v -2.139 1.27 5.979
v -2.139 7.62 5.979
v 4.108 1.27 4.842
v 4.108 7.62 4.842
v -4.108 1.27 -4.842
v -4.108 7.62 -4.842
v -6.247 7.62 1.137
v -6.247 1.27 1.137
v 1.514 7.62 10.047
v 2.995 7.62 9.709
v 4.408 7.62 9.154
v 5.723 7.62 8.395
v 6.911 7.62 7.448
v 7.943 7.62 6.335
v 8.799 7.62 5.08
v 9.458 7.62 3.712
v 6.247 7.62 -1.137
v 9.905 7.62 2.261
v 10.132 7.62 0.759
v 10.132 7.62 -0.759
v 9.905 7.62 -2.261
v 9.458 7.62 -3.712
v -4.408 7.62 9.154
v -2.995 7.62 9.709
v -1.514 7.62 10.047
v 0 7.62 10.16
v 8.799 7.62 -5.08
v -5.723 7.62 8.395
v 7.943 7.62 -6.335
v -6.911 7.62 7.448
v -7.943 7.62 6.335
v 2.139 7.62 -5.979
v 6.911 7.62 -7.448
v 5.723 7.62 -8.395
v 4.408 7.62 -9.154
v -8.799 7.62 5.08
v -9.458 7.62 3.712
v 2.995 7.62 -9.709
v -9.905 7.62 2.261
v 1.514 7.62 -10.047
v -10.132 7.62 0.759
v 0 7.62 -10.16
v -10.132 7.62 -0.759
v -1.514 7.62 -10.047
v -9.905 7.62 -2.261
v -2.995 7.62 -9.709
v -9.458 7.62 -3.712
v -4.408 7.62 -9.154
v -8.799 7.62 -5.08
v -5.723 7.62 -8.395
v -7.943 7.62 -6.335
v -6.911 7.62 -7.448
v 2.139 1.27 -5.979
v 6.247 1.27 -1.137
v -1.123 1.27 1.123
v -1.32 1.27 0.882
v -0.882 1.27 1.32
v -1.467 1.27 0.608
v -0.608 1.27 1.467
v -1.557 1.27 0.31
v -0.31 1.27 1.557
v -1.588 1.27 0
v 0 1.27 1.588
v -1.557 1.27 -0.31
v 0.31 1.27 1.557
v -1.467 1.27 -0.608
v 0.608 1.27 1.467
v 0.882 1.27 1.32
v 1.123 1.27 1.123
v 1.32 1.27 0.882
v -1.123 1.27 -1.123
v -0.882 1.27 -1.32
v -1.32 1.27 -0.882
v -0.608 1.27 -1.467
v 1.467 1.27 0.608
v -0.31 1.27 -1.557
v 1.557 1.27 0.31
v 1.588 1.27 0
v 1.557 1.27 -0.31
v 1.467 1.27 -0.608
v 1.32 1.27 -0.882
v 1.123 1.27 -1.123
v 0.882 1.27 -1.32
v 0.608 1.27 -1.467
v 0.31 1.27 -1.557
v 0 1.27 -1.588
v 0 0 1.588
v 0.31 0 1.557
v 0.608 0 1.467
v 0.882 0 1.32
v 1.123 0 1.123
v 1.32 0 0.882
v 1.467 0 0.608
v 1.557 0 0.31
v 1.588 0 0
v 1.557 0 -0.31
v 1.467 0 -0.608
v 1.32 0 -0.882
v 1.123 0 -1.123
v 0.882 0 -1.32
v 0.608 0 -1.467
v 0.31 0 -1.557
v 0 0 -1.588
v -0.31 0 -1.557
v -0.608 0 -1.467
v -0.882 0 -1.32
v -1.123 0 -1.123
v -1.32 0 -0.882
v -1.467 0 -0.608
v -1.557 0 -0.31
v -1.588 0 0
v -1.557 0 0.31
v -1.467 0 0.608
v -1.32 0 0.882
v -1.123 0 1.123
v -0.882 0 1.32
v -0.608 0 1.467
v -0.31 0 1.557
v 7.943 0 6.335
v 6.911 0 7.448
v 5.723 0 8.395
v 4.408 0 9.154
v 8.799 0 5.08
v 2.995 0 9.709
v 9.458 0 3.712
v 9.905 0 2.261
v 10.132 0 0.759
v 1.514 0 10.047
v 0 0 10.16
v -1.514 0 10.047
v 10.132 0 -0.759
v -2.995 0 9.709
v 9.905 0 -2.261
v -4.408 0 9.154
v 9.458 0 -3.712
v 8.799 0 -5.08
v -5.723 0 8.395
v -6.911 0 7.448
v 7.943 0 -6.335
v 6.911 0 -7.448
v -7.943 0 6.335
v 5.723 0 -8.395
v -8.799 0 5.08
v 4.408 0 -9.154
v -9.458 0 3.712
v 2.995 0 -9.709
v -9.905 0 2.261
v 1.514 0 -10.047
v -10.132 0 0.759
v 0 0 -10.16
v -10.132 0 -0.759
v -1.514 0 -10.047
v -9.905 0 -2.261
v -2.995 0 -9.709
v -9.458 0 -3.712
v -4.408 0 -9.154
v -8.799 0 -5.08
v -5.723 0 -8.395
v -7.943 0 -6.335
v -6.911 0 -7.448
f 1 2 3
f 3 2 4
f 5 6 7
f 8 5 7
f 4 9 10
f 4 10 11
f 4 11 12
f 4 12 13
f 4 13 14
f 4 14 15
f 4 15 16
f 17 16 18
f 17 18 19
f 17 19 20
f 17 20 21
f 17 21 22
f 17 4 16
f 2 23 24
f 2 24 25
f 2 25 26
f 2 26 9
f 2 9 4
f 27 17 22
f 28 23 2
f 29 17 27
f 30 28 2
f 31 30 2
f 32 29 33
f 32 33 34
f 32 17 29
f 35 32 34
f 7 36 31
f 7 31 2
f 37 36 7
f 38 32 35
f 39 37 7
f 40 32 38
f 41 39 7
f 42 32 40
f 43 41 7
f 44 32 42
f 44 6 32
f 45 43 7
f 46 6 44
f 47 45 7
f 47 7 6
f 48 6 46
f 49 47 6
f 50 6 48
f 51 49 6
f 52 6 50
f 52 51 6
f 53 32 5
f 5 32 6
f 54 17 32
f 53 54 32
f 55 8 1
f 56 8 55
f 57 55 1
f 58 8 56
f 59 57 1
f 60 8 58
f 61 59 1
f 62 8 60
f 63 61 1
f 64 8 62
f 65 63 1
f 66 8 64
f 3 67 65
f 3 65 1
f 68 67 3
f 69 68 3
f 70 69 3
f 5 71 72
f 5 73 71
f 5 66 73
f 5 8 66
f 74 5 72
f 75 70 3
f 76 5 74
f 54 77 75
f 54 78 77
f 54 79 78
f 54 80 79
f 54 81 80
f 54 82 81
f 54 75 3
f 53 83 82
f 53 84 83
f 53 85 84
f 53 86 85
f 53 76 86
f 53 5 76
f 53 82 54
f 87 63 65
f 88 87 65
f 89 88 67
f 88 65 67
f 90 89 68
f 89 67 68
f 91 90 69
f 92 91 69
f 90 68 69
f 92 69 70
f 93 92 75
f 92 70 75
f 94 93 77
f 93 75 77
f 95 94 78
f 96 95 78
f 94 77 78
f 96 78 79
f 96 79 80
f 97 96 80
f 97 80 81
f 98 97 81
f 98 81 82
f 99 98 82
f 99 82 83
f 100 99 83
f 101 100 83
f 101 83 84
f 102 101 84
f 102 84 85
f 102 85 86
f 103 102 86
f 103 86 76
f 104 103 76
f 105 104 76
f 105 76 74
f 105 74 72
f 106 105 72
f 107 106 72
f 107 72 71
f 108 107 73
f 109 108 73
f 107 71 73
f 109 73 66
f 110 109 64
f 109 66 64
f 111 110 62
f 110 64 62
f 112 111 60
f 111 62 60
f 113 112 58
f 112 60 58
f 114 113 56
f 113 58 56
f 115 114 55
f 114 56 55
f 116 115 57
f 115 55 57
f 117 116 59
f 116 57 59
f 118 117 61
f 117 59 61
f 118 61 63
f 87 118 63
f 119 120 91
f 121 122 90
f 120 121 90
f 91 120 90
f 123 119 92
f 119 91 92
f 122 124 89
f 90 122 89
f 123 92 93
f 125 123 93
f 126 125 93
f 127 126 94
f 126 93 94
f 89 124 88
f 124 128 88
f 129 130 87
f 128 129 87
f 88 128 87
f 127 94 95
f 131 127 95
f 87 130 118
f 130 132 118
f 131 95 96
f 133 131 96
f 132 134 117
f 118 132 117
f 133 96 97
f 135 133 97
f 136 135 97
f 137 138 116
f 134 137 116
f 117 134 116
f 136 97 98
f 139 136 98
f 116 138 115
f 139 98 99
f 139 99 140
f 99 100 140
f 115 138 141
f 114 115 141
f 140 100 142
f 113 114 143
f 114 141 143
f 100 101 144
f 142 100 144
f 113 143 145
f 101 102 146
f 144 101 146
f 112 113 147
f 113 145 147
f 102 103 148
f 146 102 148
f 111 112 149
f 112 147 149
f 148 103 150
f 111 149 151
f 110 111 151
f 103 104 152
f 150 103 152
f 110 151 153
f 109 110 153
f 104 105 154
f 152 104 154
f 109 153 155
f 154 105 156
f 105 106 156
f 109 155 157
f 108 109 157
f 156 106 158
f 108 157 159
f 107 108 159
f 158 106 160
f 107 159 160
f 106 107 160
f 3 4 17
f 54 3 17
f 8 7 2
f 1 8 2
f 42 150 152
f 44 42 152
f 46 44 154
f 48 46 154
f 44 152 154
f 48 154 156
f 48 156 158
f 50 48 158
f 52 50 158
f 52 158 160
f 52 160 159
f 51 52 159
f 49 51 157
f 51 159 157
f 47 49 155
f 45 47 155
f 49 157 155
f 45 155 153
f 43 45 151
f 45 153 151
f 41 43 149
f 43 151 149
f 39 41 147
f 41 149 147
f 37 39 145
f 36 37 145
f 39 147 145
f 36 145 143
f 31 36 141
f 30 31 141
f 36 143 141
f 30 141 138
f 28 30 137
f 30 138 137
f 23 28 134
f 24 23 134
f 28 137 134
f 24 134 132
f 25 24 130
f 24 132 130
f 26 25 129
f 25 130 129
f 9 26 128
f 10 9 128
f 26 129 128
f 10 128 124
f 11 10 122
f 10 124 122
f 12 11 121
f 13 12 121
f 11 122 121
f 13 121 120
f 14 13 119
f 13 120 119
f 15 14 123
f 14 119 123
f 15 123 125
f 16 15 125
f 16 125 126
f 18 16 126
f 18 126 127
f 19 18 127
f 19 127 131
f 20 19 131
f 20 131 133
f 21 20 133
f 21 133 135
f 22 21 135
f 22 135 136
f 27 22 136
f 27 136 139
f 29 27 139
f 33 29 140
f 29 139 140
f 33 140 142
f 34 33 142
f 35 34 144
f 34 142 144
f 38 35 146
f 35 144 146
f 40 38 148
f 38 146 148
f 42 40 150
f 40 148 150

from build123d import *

# Parameters (mm, degrees)
SKETCH1_R           = 10.16
BOSS_EXTRUDE1_DEPTH = 7.62
SKETCH2_R           = 1.5875
CUT_EXTRUDE4_DEPTH  = 17.263935563
CUT_EXTRUDE5_DEPTH  = 6.35


with BuildPart() as part:
    # Sketch1 → Boss-Extrude1 (new body)
    with BuildSketch(Plane(origin=(0, 0, 0), x_dir=(1, 0, 0), z_dir=(0, 1, 0))):
        with Locations(Location((0, 0, 0), (0, 0, 90))):
            Circle(SKETCH1_R)
    extrude(amount=BOSS_EXTRUDE1_DEPTH)

    # Sketch2 → Cut-Extrude4 (cut, through all)
    with BuildSketch(Plane(origin=(0, 7.62, 0), x_dir=(1, 0, 0), z_dir=(0, 1, 0))):
        with Locations(Location((0, 0, 0), (0, 0, 270))):
            Circle(SKETCH2_R)
    extrude(amount=-CUT_EXTRUDE4_DEPTH, mode=Mode.SUBTRACT)

    # Sketch5 → Cut-Extrude5 (cut)
    with BuildSketch(Plane(origin=(0, 7.62, 0), x_dir=(1, 0, 0), z_dir=(0, 1, 0))):
        Polygon((6.247359776, 1.137099745), (2.138922622, 5.978922145), (-4.108437154, 4.8418224), (-6.247359776, -1.137099745), (-2.138922622, -5.978922145), (4.108437154, -4.8418224), align=None)
    extrude(amount=-CUT_EXTRUDE5_DEPTH, mode=Mode.SUBTRACT)


solid = part.part
